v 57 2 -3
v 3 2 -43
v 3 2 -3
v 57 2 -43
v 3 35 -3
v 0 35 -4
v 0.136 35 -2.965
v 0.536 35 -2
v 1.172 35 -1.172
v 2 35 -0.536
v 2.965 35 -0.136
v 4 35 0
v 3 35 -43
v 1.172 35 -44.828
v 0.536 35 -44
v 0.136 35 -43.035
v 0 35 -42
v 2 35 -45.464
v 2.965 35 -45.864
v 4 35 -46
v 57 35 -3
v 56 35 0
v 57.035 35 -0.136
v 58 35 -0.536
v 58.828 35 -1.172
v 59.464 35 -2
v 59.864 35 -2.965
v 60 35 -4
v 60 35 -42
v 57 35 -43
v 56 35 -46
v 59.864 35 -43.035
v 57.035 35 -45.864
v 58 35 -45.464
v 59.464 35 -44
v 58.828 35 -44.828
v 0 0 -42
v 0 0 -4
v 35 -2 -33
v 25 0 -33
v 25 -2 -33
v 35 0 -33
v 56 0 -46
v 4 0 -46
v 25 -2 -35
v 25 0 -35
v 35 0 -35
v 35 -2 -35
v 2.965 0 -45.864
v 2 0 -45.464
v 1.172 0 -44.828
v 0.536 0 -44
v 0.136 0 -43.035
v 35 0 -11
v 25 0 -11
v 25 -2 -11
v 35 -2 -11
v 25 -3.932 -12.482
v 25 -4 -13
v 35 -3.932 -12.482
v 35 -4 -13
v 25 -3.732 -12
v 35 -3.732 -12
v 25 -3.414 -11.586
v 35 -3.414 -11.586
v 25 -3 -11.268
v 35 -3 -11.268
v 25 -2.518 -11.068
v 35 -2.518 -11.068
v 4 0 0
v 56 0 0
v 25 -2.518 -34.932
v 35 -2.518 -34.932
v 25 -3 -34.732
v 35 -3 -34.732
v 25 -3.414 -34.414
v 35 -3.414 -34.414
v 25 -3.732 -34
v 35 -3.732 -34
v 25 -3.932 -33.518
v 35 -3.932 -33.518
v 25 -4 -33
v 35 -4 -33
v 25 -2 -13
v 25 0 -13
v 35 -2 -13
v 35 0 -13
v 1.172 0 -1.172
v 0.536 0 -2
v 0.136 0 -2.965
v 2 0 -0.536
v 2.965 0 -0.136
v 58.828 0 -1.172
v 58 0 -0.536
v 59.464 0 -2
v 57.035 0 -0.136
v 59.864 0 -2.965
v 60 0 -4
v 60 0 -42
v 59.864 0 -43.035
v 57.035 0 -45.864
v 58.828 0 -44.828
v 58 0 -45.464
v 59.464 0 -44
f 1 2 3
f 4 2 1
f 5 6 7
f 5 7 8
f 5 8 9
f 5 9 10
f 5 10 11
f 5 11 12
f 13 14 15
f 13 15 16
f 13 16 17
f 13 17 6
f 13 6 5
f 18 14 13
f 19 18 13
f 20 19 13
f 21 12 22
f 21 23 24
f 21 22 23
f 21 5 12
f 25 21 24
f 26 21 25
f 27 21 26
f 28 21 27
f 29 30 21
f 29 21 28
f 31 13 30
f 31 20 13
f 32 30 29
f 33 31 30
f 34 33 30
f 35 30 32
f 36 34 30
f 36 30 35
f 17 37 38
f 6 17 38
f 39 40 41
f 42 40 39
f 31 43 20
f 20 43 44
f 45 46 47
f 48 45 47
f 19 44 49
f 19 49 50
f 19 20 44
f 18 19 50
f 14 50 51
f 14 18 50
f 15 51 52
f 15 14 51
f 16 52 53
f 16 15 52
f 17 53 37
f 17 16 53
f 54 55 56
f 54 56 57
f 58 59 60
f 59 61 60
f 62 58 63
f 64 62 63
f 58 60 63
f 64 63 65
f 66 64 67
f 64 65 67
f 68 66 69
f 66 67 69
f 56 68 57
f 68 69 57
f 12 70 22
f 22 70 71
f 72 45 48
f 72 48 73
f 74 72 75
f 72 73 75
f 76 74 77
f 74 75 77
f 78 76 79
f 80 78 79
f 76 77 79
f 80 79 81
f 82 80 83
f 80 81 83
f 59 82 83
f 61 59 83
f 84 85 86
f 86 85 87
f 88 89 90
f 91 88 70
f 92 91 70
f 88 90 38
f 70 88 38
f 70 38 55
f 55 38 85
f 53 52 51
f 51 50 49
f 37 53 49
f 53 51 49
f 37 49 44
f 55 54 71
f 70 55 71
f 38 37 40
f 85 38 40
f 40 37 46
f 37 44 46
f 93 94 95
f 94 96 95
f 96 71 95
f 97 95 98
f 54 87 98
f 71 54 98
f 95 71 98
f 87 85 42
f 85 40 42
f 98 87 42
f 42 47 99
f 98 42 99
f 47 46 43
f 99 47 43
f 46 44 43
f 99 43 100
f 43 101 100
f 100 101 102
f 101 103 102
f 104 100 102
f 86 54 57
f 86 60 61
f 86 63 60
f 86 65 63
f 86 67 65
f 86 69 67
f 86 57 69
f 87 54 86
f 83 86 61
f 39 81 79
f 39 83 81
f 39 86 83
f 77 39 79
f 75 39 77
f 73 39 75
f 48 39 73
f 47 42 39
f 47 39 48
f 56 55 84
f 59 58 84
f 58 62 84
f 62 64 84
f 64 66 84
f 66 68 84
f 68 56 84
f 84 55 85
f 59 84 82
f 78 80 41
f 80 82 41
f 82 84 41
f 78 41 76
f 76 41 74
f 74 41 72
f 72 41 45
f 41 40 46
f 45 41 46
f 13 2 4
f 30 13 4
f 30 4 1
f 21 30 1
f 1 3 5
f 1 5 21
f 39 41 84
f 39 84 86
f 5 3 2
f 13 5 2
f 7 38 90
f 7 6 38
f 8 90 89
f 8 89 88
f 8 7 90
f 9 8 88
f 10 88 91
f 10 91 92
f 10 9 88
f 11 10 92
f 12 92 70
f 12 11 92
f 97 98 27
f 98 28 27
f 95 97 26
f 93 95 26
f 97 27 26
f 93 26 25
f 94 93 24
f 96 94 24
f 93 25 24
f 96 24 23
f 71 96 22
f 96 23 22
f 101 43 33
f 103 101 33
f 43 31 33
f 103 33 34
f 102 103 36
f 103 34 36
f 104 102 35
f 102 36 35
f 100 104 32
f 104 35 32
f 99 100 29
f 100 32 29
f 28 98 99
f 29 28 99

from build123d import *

# Parameters (mm, degrees)
ESQUISSE1_W         = 54
ESQUISSE1_H         = 40
BOSS_EXTRU_9_DEPTH  = 2
ESQUISSE1_14_W      = 60
ESQUISSE1_14_H      = 46
ESQUISSE1_14_W_2    = 54
ESQUISSE1_14_H_2    = 40
BOSS_EXTRU_10_DEPTH = 35
CONG_14_R           = 4
ESQUISSE1_18_W      = 10
ESQUISSE1_18_H      = 24
BOSS_EXTRU_12_DEPTH = 2
ESQUISSE1_20_W      = 10
ESQUISSE1_20_H      = 2
BOSS_EXTRU_13_DEPTH = 2
BOSS_EXTRU_15_START = -2
ESQUISSE9_W         = 10
ESQUISSE9_H         = 24
BOSS_EXTRU_15_DEPTH = 2
CONG_15_R           = 2


with BuildPart() as part:
    # Esquisse1 → Boss.-Extru.9 (new body)
    with BuildSketch(Plane(origin=(0, 0, 0), x_dir=(1, 0, 0), z_dir=(0, 1, 0))):
        with Locations((30, 23)):
            Rectangle(ESQUISSE1_W, ESQUISSE1_H)
        Polygon((35, 33), (35, 13), (35, 11), (25, 11), (25, 13), (25, 33), (25, 35), (35, 35), align=None, mode=Mode.SUBTRACT)
    extrude(amount=BOSS_EXTRU_9_DEPTH)

    # Esquisse1<14> → Boss.-Extru.10 (add)
    with BuildSketch(Plane(origin=(0, 0, 0), x_dir=(1, 0, 0), z_dir=(0, 1, 0))):
        with Locations((30, 23)):
            Rectangle(ESQUISSE1_14_W, ESQUISSE1_14_H)
        with Locations((30, 23)):
            Rectangle(ESQUISSE1_14_W_2, ESQUISSE1_14_H_2, mode=Mode.SUBTRACT)
    extrude(amount=BOSS_EXTRU_10_DEPTH)

    # Congé14
    cong_14_edges = [part.edges().sort_by_distance(p)[0] for p in [
        (60, 17.5, 0),
        (60, 17.5, -46),
        (0, 17.5, -46),
        (0, 17.5, 0),
    ]]
    fillet(cong_14_edges, radius=CONG_14_R)

    # Esquisse1<18> → Boss.-Extru.12 (add)
    with BuildSketch(Plane(origin=(0, 0, 0), x_dir=(1, 0, 0), z_dir=(0, 1, 0))):
        with Locations((30, 23)):
            Rectangle(ESQUISSE1_18_W, ESQUISSE1_18_H)
    extrude(amount=BOSS_EXTRU_12_DEPTH)

    # Esquisse1<20> → Boss.-Extru.13 (add)
    with BuildSketch(Plane(origin=(0, 0, 0), x_dir=(1, 0, 0), z_dir=(0, 1, 0))):
        with Locations((30, 12)):
            Rectangle(ESQUISSE1_20_W, ESQUISSE1_20_H)
        with Locations((30, 34)):
            Rectangle(ESQUISSE1_20_W, ESQUISSE1_20_H)
    extrude(amount=-BOSS_EXTRU_13_DEPTH)

    # Esquisse9 → Boss.-Extru.15 (add)
    with BuildSketch(Plane(origin=(0, 0, 0), x_dir=(1, 0, 0), z_dir=(0, 1, 0)).offset(BOSS_EXTRU_15_START)):
        with Locations((30, 23)):
            Rectangle(ESQUISSE9_W, ESQUISSE9_H)
    extrude(amount=-BOSS_EXTRU_15_DEPTH)

    # Congé15
    cong_15_edges = [part.edges().sort_by_distance(p)[0] for p in [
        (30, -4, -35),
        (30, -4, -11),
    ]]
    fillet(cong_15_edges, radius=CONG_15_R)


solid = part.part
